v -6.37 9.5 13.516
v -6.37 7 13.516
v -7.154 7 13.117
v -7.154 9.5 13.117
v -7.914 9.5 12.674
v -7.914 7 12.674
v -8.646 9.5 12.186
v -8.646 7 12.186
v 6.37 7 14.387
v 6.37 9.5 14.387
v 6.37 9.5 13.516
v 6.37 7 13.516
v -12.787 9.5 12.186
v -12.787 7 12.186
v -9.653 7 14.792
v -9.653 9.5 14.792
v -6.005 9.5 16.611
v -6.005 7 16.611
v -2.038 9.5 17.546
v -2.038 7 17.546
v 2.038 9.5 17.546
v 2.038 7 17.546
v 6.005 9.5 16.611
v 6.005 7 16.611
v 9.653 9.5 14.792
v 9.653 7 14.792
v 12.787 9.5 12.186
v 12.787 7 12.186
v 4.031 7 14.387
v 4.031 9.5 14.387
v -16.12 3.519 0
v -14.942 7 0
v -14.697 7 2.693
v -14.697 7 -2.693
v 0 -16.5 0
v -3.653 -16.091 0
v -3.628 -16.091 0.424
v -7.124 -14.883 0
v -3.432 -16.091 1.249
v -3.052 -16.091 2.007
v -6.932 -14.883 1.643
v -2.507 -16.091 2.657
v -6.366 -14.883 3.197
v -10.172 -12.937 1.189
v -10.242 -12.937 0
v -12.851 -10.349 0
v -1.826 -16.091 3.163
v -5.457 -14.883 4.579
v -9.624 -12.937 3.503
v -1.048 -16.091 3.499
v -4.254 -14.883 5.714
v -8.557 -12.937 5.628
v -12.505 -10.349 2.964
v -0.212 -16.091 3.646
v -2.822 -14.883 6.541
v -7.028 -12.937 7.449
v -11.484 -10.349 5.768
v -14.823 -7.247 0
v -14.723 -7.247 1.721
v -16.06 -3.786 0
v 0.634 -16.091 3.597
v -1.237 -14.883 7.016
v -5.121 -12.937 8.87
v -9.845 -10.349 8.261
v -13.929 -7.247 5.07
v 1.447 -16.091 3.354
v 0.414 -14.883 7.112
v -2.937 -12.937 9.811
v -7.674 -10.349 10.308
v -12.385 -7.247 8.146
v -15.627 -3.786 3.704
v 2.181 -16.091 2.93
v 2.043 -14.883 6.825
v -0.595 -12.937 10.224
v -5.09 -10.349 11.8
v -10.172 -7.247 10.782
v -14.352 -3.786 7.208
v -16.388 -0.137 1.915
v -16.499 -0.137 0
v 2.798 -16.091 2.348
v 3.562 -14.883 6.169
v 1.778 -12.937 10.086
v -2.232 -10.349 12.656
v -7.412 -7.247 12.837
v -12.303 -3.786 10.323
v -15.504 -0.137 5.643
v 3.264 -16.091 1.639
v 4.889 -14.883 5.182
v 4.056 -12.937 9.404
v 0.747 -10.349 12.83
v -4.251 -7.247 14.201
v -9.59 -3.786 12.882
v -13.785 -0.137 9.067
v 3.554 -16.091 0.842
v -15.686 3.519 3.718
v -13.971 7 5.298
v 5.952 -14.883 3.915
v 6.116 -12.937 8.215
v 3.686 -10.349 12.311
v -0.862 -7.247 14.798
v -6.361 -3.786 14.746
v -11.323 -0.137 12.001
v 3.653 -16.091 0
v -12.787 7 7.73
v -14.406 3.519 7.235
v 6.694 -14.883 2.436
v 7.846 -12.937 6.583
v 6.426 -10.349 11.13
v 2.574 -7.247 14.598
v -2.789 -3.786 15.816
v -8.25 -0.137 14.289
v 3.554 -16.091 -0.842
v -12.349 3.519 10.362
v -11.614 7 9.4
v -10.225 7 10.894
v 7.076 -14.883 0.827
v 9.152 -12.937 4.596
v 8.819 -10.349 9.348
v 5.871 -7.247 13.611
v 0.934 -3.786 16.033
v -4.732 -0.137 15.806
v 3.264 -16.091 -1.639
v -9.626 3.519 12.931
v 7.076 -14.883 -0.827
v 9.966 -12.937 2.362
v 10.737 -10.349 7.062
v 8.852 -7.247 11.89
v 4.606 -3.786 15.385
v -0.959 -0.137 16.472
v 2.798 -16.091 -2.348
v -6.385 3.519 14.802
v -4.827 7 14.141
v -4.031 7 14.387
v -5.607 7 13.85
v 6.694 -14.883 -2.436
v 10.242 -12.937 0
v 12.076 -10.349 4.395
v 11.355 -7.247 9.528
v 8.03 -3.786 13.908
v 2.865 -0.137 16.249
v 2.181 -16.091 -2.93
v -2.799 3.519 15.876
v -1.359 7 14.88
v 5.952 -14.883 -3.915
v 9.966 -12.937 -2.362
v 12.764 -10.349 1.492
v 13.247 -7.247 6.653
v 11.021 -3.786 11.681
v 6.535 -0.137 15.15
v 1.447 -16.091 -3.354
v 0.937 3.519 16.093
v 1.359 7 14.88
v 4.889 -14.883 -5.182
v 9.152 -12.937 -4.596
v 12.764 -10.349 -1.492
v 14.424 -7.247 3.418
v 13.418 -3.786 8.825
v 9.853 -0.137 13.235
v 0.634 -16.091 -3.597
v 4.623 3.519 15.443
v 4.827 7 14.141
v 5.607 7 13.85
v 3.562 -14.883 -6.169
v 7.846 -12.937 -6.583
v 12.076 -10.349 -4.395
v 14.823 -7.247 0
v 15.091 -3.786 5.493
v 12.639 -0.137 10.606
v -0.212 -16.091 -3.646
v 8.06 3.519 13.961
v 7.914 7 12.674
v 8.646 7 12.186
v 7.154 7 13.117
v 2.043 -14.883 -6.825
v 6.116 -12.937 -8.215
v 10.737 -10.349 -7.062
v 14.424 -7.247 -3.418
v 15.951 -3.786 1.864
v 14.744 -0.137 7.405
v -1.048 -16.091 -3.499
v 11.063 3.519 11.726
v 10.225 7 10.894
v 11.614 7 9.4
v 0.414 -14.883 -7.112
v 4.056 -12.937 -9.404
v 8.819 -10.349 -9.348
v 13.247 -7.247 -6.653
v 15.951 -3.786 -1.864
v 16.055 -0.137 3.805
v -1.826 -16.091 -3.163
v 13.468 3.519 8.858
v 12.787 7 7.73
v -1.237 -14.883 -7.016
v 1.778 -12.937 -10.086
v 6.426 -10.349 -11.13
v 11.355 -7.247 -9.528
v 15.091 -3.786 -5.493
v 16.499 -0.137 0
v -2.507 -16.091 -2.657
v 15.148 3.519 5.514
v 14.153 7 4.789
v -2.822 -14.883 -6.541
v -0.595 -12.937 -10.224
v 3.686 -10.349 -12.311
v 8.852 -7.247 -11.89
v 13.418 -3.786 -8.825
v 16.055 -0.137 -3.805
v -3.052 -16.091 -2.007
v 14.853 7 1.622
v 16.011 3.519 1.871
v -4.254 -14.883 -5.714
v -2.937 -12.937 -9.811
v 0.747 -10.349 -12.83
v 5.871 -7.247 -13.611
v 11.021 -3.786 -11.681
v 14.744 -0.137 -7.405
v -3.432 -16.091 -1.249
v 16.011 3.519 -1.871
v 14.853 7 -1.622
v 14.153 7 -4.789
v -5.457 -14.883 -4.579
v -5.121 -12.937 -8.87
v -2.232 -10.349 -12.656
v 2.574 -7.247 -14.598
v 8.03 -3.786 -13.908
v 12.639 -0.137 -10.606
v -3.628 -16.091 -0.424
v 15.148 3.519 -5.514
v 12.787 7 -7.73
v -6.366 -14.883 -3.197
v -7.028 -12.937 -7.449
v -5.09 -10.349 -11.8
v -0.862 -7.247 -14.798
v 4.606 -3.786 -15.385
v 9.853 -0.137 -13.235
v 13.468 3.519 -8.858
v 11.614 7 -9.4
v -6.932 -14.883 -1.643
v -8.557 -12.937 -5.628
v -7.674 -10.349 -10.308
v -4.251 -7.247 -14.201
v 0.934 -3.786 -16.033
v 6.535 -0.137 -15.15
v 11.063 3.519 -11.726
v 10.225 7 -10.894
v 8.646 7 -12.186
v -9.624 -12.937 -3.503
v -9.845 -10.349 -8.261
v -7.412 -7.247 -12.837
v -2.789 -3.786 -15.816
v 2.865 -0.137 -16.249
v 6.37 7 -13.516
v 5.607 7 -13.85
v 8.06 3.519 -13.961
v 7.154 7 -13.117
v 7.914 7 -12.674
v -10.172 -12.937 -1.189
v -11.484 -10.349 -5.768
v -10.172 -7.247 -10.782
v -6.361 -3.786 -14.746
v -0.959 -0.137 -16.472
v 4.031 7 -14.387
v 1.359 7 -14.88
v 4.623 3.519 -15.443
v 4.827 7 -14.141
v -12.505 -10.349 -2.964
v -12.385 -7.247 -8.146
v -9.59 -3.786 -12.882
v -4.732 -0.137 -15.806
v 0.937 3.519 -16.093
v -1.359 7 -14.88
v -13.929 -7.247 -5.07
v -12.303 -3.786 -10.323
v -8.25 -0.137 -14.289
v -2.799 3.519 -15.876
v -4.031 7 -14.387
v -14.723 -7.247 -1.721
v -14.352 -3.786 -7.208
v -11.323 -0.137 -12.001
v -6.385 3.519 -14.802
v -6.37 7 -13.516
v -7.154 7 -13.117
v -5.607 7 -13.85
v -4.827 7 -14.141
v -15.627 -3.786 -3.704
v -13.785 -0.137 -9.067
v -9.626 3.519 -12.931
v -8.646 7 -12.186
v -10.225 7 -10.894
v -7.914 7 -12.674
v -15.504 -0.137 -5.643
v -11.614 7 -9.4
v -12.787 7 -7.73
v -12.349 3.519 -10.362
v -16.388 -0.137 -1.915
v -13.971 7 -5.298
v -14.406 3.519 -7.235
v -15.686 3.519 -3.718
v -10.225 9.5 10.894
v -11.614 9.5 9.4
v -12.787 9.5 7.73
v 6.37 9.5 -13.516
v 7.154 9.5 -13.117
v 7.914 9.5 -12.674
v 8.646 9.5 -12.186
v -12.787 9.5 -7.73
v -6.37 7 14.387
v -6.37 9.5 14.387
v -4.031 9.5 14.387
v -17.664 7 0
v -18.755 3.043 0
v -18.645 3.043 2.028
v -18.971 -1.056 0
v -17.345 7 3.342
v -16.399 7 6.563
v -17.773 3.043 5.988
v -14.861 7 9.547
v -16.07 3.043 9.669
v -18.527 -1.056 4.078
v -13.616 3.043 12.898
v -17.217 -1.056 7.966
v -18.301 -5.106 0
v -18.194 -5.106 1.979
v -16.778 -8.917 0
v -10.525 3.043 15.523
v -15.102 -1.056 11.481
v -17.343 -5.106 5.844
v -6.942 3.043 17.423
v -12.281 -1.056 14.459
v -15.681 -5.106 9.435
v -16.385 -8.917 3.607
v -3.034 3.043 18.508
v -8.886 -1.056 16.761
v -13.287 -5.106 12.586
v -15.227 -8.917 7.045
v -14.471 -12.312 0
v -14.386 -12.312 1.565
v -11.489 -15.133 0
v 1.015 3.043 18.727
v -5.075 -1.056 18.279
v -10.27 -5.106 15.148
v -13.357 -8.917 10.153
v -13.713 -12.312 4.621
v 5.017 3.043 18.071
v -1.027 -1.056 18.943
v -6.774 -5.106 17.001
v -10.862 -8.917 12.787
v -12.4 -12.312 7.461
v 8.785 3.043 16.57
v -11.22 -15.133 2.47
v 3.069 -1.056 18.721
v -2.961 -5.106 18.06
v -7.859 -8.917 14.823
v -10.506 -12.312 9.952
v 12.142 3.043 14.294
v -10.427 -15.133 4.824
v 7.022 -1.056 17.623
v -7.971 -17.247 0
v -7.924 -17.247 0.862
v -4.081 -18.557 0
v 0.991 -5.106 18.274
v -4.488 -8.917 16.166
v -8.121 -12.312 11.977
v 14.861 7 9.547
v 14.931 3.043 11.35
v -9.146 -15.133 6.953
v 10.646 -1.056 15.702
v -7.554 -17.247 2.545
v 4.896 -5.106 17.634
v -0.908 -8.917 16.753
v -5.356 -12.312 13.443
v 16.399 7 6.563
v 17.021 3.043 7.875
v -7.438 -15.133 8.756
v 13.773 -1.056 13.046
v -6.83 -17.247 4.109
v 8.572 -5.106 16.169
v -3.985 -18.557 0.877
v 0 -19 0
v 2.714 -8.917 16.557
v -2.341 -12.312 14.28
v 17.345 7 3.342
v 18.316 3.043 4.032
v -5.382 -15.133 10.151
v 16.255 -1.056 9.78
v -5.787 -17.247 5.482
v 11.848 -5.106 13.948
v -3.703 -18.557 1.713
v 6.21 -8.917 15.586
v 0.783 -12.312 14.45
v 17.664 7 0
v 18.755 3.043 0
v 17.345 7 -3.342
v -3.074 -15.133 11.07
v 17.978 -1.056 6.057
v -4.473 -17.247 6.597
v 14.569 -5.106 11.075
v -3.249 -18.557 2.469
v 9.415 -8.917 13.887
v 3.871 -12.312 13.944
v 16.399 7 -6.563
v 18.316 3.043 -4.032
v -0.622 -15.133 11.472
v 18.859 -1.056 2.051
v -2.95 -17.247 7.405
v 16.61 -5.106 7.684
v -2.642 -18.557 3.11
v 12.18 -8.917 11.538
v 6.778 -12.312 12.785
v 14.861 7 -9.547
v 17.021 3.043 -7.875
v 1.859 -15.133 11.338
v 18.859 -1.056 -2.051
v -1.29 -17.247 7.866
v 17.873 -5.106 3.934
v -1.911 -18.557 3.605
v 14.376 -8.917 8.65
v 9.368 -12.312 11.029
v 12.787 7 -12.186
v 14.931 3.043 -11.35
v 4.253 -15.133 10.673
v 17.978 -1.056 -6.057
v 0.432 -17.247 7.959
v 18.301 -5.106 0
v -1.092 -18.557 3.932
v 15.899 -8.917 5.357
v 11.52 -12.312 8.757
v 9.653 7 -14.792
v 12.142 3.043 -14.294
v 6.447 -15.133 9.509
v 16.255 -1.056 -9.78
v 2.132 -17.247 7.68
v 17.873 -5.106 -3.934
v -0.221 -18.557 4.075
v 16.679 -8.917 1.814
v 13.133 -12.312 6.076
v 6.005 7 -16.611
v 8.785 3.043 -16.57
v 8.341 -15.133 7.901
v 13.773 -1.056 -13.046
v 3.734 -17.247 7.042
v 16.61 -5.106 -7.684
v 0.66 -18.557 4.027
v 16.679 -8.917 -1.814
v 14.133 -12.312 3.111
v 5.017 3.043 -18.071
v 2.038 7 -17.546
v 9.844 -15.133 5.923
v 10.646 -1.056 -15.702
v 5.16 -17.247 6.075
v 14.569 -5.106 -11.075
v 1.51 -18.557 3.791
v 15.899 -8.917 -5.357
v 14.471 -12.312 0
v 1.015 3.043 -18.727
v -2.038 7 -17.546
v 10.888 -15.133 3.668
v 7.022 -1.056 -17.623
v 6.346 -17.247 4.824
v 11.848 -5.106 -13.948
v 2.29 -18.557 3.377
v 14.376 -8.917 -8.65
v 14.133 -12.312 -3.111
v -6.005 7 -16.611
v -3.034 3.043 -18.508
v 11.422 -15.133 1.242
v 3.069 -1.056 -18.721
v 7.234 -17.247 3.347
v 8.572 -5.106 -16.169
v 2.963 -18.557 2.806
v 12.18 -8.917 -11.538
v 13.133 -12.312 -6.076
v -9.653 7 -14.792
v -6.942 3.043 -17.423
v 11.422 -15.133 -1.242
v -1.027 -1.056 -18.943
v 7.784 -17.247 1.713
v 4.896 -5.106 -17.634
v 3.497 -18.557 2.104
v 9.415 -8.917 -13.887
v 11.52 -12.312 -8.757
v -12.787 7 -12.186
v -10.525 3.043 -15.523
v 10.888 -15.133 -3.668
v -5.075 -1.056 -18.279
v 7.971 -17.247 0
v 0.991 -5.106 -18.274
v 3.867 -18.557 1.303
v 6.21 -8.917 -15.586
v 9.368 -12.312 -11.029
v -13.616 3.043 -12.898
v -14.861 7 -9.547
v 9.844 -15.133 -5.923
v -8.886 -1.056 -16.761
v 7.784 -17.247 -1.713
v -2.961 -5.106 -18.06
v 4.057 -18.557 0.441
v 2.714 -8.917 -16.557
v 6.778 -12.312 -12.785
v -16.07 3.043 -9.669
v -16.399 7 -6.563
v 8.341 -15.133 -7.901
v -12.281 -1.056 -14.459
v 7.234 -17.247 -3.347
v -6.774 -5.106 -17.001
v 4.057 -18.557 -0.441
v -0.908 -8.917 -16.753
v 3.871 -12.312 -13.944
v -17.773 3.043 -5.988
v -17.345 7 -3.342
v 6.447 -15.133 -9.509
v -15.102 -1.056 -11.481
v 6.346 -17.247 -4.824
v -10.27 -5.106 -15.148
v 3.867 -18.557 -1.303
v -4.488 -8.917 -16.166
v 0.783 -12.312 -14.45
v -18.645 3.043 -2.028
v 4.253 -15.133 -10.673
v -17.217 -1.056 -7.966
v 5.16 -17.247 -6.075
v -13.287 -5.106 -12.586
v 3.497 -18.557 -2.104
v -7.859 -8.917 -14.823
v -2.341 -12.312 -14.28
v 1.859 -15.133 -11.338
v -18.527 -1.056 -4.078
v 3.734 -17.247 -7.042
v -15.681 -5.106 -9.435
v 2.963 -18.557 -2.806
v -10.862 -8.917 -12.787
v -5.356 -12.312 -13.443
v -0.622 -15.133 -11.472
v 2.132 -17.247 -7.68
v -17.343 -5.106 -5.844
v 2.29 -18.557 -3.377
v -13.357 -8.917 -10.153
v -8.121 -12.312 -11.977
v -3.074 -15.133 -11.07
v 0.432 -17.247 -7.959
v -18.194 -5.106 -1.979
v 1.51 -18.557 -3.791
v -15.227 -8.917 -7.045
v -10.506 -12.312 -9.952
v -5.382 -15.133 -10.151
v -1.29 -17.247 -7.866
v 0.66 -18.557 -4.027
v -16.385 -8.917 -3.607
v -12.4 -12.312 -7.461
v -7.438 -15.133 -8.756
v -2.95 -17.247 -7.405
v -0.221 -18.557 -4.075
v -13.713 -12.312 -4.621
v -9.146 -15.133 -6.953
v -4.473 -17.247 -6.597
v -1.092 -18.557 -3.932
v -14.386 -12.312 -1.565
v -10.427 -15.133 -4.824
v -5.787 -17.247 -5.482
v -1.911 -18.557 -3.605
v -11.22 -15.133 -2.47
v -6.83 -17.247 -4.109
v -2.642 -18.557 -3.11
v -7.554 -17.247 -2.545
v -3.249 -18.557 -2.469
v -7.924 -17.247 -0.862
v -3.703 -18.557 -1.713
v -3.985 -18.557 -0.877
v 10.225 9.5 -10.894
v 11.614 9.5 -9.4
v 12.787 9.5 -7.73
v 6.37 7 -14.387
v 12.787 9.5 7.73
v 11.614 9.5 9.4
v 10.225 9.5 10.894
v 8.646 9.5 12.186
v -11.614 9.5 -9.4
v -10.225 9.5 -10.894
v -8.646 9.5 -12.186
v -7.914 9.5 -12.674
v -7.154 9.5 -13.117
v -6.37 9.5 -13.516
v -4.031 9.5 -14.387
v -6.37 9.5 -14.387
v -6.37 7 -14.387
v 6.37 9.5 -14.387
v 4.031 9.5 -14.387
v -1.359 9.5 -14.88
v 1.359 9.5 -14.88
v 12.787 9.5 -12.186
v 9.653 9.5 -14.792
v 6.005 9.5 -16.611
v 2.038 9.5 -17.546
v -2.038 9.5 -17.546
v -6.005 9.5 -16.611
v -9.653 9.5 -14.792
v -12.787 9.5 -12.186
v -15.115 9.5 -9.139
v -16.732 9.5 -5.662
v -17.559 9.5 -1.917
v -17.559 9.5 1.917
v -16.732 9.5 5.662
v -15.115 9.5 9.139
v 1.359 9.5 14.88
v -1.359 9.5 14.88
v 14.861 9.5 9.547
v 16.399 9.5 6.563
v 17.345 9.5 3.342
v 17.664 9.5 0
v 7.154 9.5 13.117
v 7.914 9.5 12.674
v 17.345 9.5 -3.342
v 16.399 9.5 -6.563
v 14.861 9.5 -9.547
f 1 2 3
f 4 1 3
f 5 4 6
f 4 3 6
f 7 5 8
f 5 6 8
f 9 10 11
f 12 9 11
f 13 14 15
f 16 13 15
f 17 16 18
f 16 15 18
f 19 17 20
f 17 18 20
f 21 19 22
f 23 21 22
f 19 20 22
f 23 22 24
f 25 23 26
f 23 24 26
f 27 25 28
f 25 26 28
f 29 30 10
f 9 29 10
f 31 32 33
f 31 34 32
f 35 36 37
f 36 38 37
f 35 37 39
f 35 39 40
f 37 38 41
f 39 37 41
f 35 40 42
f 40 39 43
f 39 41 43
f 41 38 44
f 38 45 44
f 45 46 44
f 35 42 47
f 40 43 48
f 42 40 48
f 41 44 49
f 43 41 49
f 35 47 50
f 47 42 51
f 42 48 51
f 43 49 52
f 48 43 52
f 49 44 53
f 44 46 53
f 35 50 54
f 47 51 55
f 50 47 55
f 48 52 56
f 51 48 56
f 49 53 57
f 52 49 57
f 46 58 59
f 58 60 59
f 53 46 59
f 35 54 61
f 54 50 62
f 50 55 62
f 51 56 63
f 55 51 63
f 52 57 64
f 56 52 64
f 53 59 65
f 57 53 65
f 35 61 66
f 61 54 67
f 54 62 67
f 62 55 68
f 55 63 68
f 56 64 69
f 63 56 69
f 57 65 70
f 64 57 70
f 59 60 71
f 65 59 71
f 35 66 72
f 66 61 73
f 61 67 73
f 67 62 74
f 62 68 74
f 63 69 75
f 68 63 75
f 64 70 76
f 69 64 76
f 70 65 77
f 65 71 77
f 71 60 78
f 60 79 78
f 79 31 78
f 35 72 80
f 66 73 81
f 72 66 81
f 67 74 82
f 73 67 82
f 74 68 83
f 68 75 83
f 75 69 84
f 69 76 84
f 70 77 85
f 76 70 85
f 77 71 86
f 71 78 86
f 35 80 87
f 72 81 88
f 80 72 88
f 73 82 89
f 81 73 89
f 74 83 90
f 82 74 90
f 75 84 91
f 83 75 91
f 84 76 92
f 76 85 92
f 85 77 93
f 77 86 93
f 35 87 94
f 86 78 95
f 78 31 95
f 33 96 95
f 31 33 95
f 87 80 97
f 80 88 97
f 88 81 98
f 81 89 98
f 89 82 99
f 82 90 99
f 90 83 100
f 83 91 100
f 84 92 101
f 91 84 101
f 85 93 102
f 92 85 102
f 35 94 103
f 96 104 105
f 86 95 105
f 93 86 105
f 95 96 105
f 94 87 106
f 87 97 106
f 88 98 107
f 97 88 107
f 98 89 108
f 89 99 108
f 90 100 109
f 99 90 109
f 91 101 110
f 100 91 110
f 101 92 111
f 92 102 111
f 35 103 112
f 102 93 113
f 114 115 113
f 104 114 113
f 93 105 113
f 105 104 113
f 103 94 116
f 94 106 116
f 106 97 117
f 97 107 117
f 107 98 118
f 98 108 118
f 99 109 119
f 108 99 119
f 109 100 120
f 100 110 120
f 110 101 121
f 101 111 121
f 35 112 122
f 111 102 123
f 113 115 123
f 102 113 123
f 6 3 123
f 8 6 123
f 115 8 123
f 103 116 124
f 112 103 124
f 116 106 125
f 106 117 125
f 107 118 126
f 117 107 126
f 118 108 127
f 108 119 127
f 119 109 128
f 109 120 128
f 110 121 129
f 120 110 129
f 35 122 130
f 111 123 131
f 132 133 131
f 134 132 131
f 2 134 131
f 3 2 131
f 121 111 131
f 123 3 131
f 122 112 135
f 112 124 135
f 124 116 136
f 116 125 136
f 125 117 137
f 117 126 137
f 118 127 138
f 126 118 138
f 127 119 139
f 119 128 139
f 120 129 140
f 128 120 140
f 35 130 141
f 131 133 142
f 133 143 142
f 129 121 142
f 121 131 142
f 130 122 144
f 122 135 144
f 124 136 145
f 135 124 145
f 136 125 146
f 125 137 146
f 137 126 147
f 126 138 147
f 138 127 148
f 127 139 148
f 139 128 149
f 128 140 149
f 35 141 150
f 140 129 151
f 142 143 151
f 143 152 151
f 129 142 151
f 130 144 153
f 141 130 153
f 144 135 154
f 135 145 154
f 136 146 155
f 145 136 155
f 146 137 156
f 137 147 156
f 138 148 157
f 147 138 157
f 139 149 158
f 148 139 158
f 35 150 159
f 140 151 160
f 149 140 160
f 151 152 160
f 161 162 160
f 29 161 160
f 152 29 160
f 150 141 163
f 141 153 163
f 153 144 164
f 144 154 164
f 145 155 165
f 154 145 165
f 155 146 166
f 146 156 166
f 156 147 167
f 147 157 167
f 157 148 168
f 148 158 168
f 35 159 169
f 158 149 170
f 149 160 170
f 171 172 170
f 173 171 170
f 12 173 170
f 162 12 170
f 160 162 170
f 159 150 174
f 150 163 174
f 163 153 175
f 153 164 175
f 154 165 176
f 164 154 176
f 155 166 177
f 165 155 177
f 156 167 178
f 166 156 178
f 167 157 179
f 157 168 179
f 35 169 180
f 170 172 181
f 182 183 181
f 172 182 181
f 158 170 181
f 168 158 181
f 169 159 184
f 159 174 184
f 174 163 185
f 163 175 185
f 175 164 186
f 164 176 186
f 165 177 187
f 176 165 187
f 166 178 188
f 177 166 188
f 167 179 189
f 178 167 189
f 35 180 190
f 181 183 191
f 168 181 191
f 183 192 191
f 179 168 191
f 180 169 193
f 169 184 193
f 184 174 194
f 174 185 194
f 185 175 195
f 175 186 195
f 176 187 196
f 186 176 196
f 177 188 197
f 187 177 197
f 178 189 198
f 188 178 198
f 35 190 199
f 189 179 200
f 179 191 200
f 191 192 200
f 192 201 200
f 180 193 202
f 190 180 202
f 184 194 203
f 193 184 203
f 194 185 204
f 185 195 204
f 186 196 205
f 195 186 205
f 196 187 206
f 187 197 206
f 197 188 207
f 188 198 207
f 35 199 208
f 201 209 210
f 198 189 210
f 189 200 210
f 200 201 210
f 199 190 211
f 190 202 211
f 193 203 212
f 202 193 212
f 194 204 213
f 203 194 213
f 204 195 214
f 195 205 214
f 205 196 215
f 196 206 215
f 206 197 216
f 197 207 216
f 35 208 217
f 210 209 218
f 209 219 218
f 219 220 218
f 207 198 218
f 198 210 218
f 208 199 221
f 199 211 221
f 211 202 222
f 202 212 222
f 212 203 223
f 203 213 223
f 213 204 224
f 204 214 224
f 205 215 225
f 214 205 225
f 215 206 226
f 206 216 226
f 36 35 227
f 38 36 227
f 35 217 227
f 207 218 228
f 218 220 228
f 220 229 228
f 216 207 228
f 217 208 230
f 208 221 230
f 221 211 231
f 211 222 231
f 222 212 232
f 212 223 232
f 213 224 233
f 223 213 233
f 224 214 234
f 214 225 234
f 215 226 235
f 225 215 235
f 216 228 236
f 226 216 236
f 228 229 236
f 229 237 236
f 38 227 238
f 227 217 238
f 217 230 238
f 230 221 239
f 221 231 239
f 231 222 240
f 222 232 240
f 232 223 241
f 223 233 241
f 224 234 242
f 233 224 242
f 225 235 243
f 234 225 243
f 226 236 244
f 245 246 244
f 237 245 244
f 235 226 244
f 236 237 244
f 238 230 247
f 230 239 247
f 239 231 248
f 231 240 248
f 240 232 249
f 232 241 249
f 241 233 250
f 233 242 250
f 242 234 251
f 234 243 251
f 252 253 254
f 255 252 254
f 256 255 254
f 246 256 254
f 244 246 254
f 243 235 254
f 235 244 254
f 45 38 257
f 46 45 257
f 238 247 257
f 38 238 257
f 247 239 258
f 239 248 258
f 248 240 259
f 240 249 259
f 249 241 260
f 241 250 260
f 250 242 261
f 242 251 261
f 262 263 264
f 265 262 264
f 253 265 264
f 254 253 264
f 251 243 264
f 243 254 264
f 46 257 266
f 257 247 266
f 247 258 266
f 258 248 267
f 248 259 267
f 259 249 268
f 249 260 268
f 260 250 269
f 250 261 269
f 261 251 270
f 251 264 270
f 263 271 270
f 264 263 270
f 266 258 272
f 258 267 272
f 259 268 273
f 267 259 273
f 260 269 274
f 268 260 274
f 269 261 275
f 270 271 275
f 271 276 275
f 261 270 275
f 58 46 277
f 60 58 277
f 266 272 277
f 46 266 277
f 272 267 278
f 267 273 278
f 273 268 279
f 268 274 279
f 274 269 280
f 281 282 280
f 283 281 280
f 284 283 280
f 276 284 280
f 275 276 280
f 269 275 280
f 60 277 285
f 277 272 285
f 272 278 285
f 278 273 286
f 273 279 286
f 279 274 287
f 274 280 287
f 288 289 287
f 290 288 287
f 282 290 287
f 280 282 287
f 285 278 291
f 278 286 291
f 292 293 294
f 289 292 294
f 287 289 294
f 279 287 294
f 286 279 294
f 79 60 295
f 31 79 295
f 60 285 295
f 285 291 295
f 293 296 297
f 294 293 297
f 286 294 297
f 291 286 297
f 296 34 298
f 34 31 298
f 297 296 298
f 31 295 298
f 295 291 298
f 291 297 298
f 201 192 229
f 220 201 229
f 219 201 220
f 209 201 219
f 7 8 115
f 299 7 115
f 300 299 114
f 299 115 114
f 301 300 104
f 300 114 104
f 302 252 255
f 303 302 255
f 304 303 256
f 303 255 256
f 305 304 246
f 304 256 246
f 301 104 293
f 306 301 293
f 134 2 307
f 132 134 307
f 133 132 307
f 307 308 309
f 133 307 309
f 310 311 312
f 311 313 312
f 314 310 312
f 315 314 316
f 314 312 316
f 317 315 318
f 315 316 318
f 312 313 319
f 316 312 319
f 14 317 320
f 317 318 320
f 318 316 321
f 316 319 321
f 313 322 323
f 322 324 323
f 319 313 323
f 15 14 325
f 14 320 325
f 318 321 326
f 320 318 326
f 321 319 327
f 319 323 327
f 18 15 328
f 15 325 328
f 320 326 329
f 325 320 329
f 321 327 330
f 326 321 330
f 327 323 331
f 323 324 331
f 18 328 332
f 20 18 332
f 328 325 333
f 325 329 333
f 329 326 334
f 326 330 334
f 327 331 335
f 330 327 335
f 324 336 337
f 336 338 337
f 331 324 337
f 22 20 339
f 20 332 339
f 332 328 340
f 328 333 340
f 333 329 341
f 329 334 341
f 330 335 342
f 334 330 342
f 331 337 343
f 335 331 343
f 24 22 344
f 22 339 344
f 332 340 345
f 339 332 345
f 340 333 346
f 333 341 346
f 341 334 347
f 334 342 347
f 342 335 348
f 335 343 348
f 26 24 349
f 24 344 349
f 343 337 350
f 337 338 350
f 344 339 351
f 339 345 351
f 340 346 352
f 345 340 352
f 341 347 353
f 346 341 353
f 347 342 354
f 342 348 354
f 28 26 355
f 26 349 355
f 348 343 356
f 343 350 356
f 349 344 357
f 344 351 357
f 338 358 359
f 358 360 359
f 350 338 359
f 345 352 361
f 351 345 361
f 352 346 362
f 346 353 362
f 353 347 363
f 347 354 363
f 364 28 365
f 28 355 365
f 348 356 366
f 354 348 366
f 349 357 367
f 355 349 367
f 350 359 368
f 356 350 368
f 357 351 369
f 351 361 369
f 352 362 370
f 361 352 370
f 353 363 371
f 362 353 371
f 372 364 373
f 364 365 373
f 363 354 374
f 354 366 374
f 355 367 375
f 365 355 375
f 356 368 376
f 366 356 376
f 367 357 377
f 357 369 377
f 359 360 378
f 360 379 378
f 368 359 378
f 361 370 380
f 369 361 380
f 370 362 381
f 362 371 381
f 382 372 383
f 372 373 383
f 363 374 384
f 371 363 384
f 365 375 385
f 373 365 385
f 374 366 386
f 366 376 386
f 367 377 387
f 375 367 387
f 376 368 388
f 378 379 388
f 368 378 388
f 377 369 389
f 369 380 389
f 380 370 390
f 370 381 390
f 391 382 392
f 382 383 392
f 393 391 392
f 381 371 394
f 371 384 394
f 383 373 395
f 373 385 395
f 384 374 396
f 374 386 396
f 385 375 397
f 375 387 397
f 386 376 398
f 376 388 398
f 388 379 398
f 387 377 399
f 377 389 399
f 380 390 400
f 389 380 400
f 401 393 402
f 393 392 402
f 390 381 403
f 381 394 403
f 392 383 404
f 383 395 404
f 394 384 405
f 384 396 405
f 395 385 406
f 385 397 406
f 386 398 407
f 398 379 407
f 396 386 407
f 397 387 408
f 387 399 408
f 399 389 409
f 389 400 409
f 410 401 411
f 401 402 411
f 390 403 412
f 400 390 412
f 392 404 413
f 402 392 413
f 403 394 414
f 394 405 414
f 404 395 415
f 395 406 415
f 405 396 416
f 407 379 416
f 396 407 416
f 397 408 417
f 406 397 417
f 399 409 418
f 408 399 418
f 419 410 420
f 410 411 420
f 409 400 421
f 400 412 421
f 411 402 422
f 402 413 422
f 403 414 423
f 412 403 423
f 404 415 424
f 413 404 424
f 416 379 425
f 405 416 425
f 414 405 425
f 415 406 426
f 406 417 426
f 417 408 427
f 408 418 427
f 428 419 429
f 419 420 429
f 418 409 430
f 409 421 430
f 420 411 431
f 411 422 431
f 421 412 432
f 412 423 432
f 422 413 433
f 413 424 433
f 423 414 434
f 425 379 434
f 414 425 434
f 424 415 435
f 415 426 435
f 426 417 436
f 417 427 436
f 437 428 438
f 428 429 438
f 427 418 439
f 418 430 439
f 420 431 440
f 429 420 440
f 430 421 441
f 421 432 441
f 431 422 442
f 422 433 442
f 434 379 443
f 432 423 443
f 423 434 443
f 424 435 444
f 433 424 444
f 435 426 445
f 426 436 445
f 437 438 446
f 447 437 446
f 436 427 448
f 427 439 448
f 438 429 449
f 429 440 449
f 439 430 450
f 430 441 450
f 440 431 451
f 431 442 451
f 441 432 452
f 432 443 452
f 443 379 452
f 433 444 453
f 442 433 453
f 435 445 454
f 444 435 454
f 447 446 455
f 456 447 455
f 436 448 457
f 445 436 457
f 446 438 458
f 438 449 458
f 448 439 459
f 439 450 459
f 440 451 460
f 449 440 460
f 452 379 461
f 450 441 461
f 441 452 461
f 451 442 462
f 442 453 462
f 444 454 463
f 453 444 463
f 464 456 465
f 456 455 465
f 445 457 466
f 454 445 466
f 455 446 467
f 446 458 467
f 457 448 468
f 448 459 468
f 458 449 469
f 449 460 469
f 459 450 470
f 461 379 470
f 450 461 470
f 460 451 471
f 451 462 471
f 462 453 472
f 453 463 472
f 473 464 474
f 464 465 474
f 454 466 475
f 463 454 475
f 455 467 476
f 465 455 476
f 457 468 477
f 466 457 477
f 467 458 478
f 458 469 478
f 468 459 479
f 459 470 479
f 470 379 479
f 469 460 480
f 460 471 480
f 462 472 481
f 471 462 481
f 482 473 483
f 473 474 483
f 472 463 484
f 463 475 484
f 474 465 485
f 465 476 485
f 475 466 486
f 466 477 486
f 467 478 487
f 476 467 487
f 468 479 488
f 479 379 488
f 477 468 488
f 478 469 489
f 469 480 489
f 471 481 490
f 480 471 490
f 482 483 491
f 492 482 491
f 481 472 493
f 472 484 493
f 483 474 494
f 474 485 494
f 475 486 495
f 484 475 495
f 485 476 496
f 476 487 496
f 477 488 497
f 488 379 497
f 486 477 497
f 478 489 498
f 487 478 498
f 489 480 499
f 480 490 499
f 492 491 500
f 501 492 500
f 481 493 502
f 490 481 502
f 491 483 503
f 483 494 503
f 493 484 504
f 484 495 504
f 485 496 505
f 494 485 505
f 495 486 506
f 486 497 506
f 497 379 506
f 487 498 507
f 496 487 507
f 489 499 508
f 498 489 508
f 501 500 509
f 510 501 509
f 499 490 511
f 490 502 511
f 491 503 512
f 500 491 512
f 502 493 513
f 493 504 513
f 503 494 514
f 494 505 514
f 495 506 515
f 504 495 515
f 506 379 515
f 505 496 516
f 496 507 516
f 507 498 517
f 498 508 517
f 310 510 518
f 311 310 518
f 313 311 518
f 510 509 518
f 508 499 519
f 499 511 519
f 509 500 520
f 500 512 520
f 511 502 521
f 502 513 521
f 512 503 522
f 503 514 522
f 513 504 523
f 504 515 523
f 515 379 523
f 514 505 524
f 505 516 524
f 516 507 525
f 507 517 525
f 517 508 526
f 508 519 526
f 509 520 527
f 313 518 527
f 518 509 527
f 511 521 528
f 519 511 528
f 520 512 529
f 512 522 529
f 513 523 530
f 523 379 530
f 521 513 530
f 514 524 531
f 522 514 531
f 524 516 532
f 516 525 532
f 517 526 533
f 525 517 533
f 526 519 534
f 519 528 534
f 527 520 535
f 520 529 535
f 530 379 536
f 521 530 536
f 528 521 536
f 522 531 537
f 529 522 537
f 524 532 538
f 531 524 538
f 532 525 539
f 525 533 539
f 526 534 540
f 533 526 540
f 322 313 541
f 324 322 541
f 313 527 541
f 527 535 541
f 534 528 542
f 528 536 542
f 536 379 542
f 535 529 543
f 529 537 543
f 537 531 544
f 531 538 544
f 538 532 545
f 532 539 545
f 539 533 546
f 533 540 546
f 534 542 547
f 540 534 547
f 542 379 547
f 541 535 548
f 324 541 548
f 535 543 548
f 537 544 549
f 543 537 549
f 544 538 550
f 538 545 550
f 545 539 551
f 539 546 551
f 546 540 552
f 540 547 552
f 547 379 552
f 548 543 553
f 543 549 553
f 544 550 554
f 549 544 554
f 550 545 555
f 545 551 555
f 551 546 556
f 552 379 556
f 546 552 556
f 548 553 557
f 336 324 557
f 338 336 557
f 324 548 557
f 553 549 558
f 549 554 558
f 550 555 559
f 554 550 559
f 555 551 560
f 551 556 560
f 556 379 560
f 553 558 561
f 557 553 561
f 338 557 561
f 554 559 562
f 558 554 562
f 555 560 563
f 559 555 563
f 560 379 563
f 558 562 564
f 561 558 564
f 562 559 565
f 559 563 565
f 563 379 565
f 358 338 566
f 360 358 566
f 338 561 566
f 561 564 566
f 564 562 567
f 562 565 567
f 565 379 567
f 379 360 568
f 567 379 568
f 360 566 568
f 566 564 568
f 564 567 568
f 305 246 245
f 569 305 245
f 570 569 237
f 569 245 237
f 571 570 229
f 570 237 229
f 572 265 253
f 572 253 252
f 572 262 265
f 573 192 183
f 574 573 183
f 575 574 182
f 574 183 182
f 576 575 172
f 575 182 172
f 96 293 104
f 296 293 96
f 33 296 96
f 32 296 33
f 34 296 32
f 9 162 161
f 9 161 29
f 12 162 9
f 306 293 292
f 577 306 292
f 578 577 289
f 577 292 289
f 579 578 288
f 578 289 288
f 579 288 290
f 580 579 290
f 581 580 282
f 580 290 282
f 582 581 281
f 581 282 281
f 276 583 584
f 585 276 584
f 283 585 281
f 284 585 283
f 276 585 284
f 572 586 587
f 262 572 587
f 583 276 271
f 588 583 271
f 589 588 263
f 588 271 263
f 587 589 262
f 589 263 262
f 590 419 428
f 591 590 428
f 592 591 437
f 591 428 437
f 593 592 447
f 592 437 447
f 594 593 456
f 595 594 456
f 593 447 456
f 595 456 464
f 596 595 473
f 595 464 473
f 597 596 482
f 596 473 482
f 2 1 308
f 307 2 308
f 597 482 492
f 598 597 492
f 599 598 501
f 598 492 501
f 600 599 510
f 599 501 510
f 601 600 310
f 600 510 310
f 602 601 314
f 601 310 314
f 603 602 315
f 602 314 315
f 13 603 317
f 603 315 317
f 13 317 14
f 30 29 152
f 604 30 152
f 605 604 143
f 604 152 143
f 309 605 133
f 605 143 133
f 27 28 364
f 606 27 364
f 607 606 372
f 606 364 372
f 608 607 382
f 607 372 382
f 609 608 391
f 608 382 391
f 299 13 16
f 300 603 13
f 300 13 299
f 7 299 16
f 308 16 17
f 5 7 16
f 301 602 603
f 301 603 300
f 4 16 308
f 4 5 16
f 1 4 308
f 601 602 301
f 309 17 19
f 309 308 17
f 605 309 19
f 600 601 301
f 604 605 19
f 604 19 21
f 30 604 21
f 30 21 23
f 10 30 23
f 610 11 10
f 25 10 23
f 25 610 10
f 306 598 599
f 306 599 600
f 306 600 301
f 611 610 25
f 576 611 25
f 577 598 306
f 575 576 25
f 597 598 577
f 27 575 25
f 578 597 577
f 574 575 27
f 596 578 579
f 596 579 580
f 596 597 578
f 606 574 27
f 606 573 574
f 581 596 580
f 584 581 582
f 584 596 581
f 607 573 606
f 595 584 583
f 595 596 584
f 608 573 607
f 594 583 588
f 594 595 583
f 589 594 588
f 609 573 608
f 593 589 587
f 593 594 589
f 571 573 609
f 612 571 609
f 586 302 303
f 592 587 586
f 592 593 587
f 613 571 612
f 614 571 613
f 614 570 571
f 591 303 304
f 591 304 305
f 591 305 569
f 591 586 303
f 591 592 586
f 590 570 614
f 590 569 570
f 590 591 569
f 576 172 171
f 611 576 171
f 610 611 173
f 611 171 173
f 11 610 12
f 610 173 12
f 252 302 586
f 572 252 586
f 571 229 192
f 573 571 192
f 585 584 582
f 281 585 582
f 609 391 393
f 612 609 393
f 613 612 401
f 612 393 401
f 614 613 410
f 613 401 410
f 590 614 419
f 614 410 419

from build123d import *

# Parameters (mm, degrees)
BOSS_EXTRUDE1_DEPTH = 2.5
CUT_EXTRUDE1_DEPTH  = 2.5


with BuildPart() as part:
    # Sketch1 one side → Revolve2 (revolve)
    with BuildSketch(Plane.XY):
        with BuildLine():
            ThreePointArc((0, -16.5), (-13.923900316, -8.852965605), (-14.941552797, 7))
            Line((-14.941552797, 7), (-17.663521733, 7))
            ThreePointArc((-17.663521733, 7), (-15.716233646, -10.677078252), (0, -19))
            Line((0, -19), (0, -16.5))
        make_face()
    revolve(axis=Axis((0, -16.5, 0), (0, 1, 0)))

    # Sketch2 → Boss-Extrude1 (add)
    with BuildSketch(Plane(origin=(0, 7, 0), x_dir=(1, 0, 0), z_dir=(0, 1, 0))):
        with BuildLine():
            ThreePointArc((17.663521733, 0), (16.399068955, 6.562814748), (12.786743696, 12.186024194))
            Line((12.786743696, 12.186024194), (12.786743696, 7.729759741))
            ThreePointArc((12.786743696, 7.729759741), (14.392772597, 4.012243385), (14.941552797, 0))
            ThreePointArc((14.941552797, 0), (14.392772597, -4.012243385), (12.786743696, -7.729759741))
            Line((12.786743696, -7.729759741), (12.786743696, -12.186024194))
            ThreePointArc((12.786743696, -12.186024194), (16.399068955, -6.562814748), (17.663521733, 0))
        make_face()
        with BuildLine():
            ThreePointArc((14.941552797, 0), (14.392772597, 4.012243385), (12.786743696, 7.729759741))
            Line((12.786743696, 7.729759741), (12.786743696, -7.729759741))
            ThreePointArc((12.786743696, -7.729759741), (14.392772597, -4.012243385), (14.941552797, 0))
        make_face()
        with BuildLine():
            Line((-12.786743696, 7.729759741), (-12.786743696, 12.186024194))
            ThreePointArc((-12.786743696, 12.186024194), (-17.663521733, 0), (-12.786743696, -12.186024194))
            Line((-12.786743696, -12.186024194), (-12.786743696, -7.729759741))
            ThreePointArc((-12.786743696, -7.729759741), (-14.941552797, 0), (-12.786743696, 7.729759741))
        make_face()
        with BuildLine():
            Line((-12.786743696, -7.729759741), (-12.786743696, 7.729759741))
            ThreePointArc((-12.786743696, 7.729759741), (-14.941552797, 0), (-12.786743696, -7.729759741))
        make_face()
        with BuildLine():
            Line((8.645855328, 12.186024194), (12.786743696, 12.186024194))
            ThreePointArc((12.786743696, 12.186024194), (0, 17.663521733), (-12.786743696, 12.186024194))
            Line((-12.786743696, 12.186024194), (-8.645855328, 12.186024194))
            ThreePointArc((-8.645855328, 12.186024194), (0, 14.941552797), (8.645855328, 12.186024194))
        make_face()
        with BuildLine():
            Line((12.786743696, 7.729759741), (12.786743696, 12.186024194))
            Line((12.786743696, 12.186024194), (8.645855328, 12.186024194))
            ThreePointArc((8.645855328, 12.186024194), (10.9454853, 10.170857955), (12.786743696, 7.729759741))
        make_face()
        with BuildLine():
            Line((-8.645855328, 12.186024194), (-12.786743696, 12.186024194))
            Line((-12.786743696, 12.186024194), (-12.786743696, 7.729759741))
            ThreePointArc((-12.786743696, 7.729759741), (-10.9454853, 10.170857955), (-8.645855328, 12.186024194))
        make_face()
        with BuildLine():
            Line((-12.786743696, -7.729759741), (-12.786743696, -12.186024194))
            Line((-12.786743696, -12.186024194), (-8.645855328, -12.186024194))
            ThreePointArc((-8.645855328, -12.186024194), (-10.9454853, -10.170857955), (-12.786743696, -7.729759741))
        make_face()
        with BuildLine():
            Line((12.786743696, -12.186024194), (12.786743696, -7.729759741))
            ThreePointArc((12.786743696, -7.729759741), (10.9454853, -10.170857955), (8.645855328, -12.186024194))
            Line((8.645855328, -12.186024194), (12.786743696, -12.186024194))
        make_face()
        with BuildLine():
            ThreePointArc((-12.786743696, -12.186024194), (0, -17.663521733), (12.786743696, -12.186024194))
            Line((12.786743696, -12.186024194), (8.645855328, -12.186024194))
            ThreePointArc((8.645855328, -12.186024194), (0, -14.941552797), (-8.645855328, -12.186024194))
            Line((-8.645855328, -12.186024194), (-12.786743696, -12.186024194))
        make_face()
    extrude(amount=BOSS_EXTRUDE1_DEPTH)

    # Sketch3 → Cut-Extrude1 (cut)
    with BuildSketch(Plane(origin=(0, 9.5, 0), x_dir=(1, 0, 0), z_dir=(0, 1, 0))):
        with BuildLine():
            Line((-6.37, 14.38749457), (-6.37, 13.515661286))
            ThreePointArc((-6.37, 13.515661286), (-5.218801949, 14.000503784), (-4.031128874, 14.38749457))
            Line((-4.031128874, 14.38749457), (-6.37, 14.38749457))
        make_face()
        with BuildLine():
            Line((6.37, 14.38749457), (4.031128874, 14.38749457))
            ThreePointArc((4.031128874, 14.38749457), (5.218801949, 14.000503784), (6.37, 13.515661286))
            Line((6.37, 13.515661286), (6.37, 14.38749457))
        make_face()
        with BuildLine():
            ThreePointArc((6.37, -13.515661286), (5.218801949, -14.000503784), (4.031128874, -14.38749457))
            Line((4.031128874, -14.38749457), (6.37, -14.38749457))
            Line((6.37, -14.38749457), (6.37, -13.515661286))
        make_face()
        with BuildLine():
            Line((-6.37, -13.515661286), (-6.37, -14.38749457))
            Line((-6.37, -14.38749457), (-4.031128874, -14.38749457))
            ThreePointArc((-4.031128874, -14.38749457), (-5.218801949, -14.000503784), (-6.37, -13.515661286))
        make_face()
    extrude(amount=-CUT_EXTRUDE1_DEPTH, mode=Mode.SUBTRACT)


solid = part.part
